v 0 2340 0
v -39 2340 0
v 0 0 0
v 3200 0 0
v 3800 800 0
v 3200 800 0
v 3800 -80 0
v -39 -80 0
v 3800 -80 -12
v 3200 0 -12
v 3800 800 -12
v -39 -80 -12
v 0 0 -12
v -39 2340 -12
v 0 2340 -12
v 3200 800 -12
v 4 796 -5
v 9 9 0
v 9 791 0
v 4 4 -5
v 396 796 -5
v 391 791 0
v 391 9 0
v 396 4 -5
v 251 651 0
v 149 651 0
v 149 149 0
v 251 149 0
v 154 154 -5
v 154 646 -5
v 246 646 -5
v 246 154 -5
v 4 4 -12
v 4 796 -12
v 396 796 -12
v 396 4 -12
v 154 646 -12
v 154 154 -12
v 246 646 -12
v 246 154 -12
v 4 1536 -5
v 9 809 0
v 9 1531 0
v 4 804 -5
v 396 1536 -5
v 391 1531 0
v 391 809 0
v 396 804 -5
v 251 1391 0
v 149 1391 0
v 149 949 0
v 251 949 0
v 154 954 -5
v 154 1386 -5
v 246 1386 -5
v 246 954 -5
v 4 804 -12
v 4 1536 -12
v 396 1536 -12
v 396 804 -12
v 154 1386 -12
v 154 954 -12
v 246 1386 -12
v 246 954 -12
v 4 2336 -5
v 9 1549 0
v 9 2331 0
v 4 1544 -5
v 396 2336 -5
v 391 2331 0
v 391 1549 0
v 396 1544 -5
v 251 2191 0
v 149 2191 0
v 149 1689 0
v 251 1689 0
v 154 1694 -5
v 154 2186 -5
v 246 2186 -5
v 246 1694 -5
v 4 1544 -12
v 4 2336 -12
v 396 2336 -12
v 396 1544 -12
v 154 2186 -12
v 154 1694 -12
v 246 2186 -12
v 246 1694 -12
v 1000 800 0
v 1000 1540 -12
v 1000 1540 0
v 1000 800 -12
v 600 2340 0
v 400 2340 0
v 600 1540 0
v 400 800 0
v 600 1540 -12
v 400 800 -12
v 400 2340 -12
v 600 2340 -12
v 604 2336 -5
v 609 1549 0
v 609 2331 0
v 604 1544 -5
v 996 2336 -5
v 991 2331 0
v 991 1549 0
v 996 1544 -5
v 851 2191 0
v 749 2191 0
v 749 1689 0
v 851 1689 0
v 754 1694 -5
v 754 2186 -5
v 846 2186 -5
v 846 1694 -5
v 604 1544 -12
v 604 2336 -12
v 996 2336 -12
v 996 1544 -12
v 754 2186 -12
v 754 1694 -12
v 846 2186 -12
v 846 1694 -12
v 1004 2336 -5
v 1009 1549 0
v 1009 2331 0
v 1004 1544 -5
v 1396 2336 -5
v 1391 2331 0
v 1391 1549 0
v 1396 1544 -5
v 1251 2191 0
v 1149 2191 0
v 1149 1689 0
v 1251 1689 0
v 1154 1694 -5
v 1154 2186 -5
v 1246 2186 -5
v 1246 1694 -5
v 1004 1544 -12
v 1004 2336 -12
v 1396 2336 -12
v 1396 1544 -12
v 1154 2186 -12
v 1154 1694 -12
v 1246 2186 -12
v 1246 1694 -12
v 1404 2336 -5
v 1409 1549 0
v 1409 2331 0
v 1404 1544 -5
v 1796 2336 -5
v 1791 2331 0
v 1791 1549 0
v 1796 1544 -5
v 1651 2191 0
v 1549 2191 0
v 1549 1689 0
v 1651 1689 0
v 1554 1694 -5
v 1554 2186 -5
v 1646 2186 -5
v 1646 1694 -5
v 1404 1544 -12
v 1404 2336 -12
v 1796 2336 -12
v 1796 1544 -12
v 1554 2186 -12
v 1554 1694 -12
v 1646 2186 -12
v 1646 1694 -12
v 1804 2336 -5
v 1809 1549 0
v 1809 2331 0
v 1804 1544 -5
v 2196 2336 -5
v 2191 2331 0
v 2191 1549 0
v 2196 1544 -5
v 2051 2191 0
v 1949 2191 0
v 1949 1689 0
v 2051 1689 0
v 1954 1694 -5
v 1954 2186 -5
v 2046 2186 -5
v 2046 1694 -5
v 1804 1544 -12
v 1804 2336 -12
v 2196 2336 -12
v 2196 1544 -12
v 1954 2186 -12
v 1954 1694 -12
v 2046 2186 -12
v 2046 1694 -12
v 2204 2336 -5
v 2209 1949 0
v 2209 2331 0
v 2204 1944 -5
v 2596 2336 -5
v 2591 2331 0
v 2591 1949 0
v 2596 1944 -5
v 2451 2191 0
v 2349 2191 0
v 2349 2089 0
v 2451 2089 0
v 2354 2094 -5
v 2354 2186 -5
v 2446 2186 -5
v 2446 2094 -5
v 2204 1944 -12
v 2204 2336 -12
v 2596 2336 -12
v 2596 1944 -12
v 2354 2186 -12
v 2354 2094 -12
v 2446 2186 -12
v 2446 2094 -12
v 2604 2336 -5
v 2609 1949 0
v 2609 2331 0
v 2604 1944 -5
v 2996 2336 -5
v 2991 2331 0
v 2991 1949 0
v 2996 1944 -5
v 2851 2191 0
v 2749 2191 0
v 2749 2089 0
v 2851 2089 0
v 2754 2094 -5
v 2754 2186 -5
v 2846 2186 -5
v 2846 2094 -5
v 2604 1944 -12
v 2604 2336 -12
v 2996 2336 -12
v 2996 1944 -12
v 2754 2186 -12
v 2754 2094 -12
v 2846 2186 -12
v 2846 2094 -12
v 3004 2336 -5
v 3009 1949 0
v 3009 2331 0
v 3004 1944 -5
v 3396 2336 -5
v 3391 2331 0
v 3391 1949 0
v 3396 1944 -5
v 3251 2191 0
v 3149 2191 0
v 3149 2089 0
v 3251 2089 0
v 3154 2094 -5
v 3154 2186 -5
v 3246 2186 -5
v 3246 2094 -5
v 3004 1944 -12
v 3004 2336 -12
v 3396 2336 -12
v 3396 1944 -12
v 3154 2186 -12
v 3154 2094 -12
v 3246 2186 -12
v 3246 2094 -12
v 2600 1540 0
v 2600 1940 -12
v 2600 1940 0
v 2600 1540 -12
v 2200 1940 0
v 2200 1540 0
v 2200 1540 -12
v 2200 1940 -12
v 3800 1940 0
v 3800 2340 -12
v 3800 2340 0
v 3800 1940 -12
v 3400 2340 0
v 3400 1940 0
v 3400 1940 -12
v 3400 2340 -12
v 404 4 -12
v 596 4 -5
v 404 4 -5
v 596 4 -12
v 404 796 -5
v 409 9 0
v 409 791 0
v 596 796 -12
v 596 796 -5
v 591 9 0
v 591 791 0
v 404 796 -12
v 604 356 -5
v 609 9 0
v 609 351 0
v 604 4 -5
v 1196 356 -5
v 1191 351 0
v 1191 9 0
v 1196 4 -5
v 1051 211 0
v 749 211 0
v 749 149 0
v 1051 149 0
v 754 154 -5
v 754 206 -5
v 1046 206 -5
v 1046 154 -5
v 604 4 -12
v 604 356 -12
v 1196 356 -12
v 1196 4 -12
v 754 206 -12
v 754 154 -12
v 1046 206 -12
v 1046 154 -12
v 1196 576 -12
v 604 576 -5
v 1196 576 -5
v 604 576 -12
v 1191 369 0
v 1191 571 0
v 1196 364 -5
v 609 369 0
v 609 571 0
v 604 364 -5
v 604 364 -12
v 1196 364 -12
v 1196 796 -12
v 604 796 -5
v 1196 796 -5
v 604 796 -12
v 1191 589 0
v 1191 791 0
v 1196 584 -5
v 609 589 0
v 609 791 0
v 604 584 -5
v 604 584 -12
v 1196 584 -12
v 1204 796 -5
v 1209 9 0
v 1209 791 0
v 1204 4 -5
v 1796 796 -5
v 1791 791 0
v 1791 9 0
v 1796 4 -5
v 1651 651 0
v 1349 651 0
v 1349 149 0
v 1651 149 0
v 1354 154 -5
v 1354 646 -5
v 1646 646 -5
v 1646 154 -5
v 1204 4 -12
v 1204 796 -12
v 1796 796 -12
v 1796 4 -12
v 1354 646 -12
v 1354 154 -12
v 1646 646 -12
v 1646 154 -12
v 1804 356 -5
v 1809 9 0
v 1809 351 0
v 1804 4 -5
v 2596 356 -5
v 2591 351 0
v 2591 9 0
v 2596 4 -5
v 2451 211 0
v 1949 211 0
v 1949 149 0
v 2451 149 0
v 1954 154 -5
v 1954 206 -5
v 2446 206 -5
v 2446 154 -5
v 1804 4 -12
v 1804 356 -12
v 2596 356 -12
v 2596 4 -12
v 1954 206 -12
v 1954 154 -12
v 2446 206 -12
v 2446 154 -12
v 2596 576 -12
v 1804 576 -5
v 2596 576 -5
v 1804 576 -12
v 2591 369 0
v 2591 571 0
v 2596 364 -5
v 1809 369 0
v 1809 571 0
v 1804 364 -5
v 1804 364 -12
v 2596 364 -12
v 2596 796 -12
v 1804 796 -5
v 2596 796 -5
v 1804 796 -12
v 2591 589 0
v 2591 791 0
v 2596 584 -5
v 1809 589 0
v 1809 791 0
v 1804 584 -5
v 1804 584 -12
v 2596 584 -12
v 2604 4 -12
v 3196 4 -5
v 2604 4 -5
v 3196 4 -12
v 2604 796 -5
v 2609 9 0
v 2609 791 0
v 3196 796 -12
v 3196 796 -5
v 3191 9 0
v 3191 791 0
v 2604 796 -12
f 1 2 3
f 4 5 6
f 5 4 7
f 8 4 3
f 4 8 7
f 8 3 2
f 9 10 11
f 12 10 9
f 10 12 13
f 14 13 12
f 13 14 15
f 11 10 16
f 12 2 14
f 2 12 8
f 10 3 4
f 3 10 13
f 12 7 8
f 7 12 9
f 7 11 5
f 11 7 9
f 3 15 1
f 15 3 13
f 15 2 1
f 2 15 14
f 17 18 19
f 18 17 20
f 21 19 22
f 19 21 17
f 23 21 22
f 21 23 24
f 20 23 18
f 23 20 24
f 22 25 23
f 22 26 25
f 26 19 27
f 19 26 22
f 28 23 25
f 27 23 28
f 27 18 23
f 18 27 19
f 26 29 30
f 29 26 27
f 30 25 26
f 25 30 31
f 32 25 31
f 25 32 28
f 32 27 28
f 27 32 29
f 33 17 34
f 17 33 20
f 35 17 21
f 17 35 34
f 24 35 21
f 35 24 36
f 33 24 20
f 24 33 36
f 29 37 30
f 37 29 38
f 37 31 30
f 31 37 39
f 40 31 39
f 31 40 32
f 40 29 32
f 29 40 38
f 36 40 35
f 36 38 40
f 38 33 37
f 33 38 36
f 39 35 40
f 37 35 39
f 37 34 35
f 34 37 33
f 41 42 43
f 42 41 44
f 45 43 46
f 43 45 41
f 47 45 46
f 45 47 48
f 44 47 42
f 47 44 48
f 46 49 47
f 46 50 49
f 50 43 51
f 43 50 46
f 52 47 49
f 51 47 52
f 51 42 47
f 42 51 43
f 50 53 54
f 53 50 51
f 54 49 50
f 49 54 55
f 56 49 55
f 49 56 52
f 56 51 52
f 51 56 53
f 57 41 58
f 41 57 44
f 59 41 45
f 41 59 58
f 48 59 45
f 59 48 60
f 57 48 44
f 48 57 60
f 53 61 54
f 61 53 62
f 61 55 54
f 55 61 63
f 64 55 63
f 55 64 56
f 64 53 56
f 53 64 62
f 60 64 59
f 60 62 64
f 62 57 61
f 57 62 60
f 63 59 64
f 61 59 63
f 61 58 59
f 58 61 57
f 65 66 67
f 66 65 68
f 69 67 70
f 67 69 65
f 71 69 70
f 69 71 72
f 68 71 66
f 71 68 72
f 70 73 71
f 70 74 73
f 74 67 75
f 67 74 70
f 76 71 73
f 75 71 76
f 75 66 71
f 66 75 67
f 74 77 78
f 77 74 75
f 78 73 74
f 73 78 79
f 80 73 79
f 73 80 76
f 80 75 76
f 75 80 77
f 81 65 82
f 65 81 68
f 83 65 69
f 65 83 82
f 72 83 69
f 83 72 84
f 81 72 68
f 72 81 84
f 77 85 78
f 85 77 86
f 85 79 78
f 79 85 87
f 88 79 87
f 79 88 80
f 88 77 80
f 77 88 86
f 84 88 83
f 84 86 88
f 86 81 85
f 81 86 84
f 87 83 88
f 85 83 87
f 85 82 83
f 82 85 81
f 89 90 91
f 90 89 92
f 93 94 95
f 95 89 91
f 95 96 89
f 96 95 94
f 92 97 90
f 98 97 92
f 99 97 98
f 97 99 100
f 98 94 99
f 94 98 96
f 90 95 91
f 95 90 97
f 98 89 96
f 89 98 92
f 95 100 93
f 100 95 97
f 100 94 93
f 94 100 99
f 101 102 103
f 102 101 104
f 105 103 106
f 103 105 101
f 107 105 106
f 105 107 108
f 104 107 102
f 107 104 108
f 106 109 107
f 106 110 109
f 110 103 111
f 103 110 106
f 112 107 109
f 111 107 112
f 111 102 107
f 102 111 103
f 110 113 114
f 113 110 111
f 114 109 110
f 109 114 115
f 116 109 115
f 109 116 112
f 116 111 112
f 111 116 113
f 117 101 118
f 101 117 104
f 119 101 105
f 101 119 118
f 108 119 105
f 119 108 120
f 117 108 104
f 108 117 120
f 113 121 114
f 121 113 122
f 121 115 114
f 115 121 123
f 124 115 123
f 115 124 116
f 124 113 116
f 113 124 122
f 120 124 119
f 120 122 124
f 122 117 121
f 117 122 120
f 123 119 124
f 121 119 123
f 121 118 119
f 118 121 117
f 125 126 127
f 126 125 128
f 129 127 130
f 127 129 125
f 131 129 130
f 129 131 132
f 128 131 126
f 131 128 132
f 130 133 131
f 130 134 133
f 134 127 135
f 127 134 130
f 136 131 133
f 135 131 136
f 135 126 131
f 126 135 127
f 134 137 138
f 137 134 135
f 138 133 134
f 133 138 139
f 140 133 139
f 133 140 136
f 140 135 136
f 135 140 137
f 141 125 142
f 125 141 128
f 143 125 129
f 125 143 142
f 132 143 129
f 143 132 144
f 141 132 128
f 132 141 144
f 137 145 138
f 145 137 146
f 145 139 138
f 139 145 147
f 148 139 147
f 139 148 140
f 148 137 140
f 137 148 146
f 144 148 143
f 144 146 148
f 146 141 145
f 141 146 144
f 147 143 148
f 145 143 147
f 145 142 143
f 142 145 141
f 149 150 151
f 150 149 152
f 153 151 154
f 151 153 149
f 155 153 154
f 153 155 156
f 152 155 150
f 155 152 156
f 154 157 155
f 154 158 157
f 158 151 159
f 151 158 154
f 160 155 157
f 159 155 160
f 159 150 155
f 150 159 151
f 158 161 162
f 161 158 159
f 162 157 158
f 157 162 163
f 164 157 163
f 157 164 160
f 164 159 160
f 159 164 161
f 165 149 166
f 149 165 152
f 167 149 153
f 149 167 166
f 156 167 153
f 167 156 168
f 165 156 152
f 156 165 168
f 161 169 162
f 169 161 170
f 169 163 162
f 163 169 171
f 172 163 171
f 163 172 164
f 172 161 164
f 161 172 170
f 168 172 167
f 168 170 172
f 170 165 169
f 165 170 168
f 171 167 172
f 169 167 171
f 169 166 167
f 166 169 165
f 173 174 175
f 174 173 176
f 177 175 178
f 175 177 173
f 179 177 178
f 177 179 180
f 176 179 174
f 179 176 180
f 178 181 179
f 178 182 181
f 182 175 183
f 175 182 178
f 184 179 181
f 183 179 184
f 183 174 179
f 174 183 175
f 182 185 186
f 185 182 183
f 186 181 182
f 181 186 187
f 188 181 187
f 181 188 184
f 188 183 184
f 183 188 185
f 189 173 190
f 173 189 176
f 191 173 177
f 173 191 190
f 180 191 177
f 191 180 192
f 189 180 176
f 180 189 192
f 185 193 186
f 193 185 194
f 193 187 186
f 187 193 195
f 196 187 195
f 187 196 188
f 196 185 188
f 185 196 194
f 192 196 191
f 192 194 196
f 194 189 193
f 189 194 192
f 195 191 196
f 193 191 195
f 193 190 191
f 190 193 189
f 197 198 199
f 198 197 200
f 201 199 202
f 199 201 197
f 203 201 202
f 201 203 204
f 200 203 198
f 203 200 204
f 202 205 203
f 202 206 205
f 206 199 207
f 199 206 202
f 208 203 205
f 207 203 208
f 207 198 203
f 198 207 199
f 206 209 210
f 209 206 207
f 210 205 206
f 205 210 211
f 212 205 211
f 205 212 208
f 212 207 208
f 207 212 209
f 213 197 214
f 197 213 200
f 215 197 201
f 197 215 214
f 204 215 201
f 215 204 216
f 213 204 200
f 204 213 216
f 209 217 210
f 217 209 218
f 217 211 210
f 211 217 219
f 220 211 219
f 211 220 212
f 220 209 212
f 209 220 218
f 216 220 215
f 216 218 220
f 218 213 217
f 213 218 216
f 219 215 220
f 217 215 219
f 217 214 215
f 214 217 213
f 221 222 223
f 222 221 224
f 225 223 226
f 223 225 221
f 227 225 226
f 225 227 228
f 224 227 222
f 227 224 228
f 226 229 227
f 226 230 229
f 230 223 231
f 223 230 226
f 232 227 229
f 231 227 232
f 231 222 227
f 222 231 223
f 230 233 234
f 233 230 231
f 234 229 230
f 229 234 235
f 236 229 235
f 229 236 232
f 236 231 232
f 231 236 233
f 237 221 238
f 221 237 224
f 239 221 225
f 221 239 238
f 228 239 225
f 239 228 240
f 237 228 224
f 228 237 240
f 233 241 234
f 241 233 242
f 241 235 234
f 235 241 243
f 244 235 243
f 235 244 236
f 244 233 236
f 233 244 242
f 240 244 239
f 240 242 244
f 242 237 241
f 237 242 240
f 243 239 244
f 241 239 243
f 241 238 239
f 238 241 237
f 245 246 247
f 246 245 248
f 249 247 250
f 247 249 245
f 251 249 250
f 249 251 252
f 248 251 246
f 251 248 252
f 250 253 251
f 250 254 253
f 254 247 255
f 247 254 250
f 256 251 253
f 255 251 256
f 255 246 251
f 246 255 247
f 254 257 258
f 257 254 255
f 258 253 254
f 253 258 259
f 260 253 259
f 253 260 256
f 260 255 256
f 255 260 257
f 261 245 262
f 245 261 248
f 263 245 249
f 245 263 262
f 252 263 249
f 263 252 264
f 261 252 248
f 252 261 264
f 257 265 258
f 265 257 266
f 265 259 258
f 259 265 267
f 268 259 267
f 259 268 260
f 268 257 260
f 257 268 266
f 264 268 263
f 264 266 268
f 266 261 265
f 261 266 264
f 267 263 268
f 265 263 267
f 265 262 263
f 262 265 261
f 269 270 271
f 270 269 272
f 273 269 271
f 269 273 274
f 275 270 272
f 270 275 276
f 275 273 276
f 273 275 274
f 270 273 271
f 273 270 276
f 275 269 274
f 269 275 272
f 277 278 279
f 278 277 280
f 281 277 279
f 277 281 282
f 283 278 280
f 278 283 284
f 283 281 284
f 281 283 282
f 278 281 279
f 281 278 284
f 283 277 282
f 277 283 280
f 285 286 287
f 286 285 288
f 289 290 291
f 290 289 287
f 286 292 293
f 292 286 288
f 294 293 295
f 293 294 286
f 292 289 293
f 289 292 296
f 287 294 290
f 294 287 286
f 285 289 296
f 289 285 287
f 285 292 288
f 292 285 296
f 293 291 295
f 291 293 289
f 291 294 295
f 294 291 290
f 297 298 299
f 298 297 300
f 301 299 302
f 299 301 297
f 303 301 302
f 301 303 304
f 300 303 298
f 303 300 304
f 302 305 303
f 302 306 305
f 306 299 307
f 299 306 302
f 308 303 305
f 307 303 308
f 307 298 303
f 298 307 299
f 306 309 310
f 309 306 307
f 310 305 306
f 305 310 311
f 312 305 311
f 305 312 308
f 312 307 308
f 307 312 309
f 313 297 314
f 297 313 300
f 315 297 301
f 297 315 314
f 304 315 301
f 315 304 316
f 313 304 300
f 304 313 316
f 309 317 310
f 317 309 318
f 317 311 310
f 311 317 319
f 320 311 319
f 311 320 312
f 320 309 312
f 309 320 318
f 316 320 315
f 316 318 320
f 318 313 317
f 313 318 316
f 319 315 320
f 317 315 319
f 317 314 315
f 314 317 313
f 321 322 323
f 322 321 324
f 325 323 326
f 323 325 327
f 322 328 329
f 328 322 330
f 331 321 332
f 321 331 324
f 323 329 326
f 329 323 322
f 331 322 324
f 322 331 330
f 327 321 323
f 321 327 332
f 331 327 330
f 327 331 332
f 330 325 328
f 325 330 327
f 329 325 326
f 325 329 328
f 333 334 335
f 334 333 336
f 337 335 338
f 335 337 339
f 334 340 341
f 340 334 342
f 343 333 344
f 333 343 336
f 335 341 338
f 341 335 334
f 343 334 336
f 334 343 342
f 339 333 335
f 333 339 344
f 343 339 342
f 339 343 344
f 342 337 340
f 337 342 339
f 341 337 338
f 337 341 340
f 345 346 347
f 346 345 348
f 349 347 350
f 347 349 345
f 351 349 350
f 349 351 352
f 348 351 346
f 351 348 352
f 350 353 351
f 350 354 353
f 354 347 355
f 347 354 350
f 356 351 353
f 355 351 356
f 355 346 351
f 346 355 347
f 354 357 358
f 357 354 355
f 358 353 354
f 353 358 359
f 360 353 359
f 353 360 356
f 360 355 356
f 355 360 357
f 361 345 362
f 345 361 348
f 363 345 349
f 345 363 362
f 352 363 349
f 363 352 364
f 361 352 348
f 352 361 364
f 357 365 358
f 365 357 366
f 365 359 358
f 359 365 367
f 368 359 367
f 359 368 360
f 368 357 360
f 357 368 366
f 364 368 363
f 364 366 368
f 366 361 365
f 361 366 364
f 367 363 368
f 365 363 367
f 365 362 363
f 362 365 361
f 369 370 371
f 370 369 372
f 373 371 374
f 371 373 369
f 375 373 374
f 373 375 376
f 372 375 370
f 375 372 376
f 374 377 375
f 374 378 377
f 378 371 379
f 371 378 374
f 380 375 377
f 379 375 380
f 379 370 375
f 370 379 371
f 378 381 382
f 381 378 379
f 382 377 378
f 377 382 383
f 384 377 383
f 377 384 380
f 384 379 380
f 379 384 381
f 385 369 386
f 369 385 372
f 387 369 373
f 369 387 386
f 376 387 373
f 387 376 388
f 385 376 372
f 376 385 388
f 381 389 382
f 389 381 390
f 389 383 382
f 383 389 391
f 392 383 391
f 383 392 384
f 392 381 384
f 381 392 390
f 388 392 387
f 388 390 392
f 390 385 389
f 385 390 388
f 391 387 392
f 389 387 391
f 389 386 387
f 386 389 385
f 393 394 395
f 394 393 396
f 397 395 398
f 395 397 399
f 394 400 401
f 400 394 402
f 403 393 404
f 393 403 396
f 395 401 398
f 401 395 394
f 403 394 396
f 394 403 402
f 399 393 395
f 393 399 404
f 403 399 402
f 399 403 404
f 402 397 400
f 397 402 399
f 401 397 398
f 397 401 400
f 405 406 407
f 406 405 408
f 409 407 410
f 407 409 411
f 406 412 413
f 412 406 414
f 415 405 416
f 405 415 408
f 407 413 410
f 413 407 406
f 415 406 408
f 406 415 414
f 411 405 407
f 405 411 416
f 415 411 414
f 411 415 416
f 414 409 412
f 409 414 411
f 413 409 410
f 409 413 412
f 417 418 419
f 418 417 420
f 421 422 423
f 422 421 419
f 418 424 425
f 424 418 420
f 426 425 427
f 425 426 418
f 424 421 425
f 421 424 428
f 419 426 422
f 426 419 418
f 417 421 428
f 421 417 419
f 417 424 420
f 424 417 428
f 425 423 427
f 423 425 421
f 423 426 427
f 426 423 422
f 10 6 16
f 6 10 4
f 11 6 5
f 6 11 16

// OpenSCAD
// file: door.scad
b = 150;
p = 4; // padding
f = 5; 
d = 12;
module setDoorGlobals(border,thickness,fase,padding) {
    b = border;
    p = padding;
    d = thickness;
    f = fase;
}
function getDoorPoints(width,height) =
    [[0,0,0], // 0
      [        p,         p,  -f],   // 1
      [        p,  height-p,  -f],   // 2
      [  width-p,  height-p,  -f],   // 3
      [  width-p,         p,  -f],   // 4
      [      f+p,       f+p,   0],   // 5
      [      f+p,height-f-p,   0],   // 6
      [width-f-p,height-f-p,   0],   // 7
      [width-f-p,       f+p,   0],   // 8
      [    b-f+p,     b-f+p,   0],   // 9
      [    b-f+p,height-b+f-p, 0],   // 10
      [width-b+f-p,height-b+f-p,0],  // 11
      [width-b+f-p,   b-f+p,   0],   // 12
      [      b+p,       b+p,  -f],   // 13
      [      b+p,height-b-p,  -f],   // 14
      [width-b-p,height-b-p,  -f],   // 15
      [width-b-p,       b+p,  -f],   // 16
      [        p,         p,  -d],   // 17
      [        p,  height-p,  -d],   // 18
      [  width-p,  height-p,  -d],   // 19
      [  width-p,         p,  -d],   // 20
      [      b+p,       b+p,  -d],   // 21
      [      b+p,height-b-p,  -d],   // 22
      [width-b-p,height-b-p,  -d],   // 23
      [width-b-p,       b+p,  -d],   // 24
      ];
module gDoor(x,y,width,height) {
    translate([x,y,0])
    polyhedron(
    points = getDoorPoints(width,height),  
    faces = [[ 1, 2, 6, 5],  // a
             [ 2, 3, 7, 6],  // b
             [ 3, 4, 8, 7],  // c
             [ 4, 1, 5, 8],  // d
             [ 5, 6,10, 9],  // e
             [ 6, 7,11,10],  // f
             [ 7, 8,12,11],  // g
             [ 8, 5, 9,12],  // h
             [ 9,10,14,13],  // i
             [10,11,15,14],  // j
             [11,12,16,15],  // k
             [12, 9,13,16],  // l
             [ 2, 1,17,18],  //aussenrand
             [ 3, 2,18,19],
             [ 4, 3,19,20],
             [ 1, 4,20,17],
             [13,14,22,21],  //innenrand  
             [14,15,23,22],
             [15,16,24,23],
             [16,13,21,24],
             [21,22,18,17],  // rueckseite
             [22,23,19,18],
             [23,24,20,19],
             [24,21,17,20]
             ]); 
}

module mDoor(x,y,width,height) {
    translate([x,y,0])
    polyhedron(
 getDoorPoints(width,height),  
    faces = [[ 1, 2, 6, 5],  // a
             [ 2, 3, 7, 6],  // b
             [ 3, 4, 8, 7],  // c
             [ 4, 1, 5, 8],  // d
             [ 5, 6,7, 8],  // front
             [ 2, 1,17,18],  //aussenrand
             [ 3, 2,18,19],
             [ 4, 3,19,20],
             [ 1, 4,20,17],
             [20,19,18,17]   // rueckseite
           ]); 
}
module sDoor(x,y,width,height) {
    translate([x,y,-d])
        cube([width,height,d]);
}
//gDoor(0,0,600,800);
//gDoor(700,0,600,800);
// file: front.scad
include <door.scad>

sockelH = 80;
tableH = 800;
fullH = 2200+140;
headBH = 800;
headSH = 400;
drawBH = 360;
drawSH = 220;
doorM = 1;
doorG = 2;
doorS = 3;
border = 150;
padding = 4; 
fase = 15; 
thickness = 20;
cWood = [.83,.80,.75];
cWall = [1,1,1];
cBench = [0.1,0.1,0.1];
function getFronts()=[
    // Sockel
    [doorS,-39, -sockelH ,6*400+200+39,sockelH,0,[0,0]],        //  0
    [doorS,6*400+200, -sockelH,600,sockelH,-90,[0,0]],          //  1
    [doorS,6*400+200+600, -sockelH,600,sockelH,0,[-600,600]],   //  2
    [doorS,-39, 0, 39,fullH,0,[0,0]],
    
    // Hochschrank
    [doorG,0,0,400,tableH,0,[0,0]],                             //  3
    [doorG,0,tableH,400,fullH-tableH-headBH,0,[0,0]],           //  4
    [doorG,0,fullH-headBH,400,headBH,0,[0,0]],                  //  5
    // Seitenteil
    [doorS,400,tableH,600,fullH-tableH-headBH,90,[0,0]],        //  6
    [doorS,400,fullH-headBH,200,headBH,90,[0,0]],               //  7
    // Grosse Oberschraenke
    for(i = [0:3])
        [doorG,600+i*400,fullH-headBH,400,headBH,0,[-200,-200]],    //  8..11
    // Kleine Oberschraenke
    for(i = [0:1])
        [doorG,200+5*400+i*400,fullH-headSH,400,headSH,0,[-200,-200]],  // 12,13
    [doorG,200+5*400+2*400,fullH-headSH,400,headSH,-90,[-200,-200]],    // 14
    // Abschluss Seitenteil gross zu klein
    [doorS,200+5*400,fullH-headBH,400,headBH-headSH,90,[-200,-200]],    // 15
 // Abschluss Seitenteil oben
    [doorS,200+8*400,fullH-headSH,400,headSH,0,[-600,200]],             // 16
 
    // Schmaler Schieber
    [doorM,400,0,200,800,0,[0,0]],                              // 17
    // Schieber unter Kochfeld
    [doorG,600,0,600,drawBH,0,[0,0]],                           // 18
    [doorM,600,drawBH,600,drawSH,0,[0,0]],                      // 19
    [doorM,600,drawBH+drawSH,600,drawSH,0,[0,0]],               // 20
    // Spuele 
    [doorG,2*600,0,600,tableH,0,[0,0]],                         // 21
    // Breite Schieber
    [doorG,3*600,0,800,drawBH,0,[0,0]],                         // 22
    [doorM,3*600,drawBH,800,drawSH,0,[0,0]],                    // 23
    [doorM,3*600,drawBH+drawSH,800,drawSH,0,[0,0]],             // 24
    // Geschirrspueler
    [doorM,3*600+800,0,600,tableH,-90,[0,0]],                   // 25
    // Abschluss Seitenteil unten
    [doorS,4*600+800,0,600,tableH,0,[-600,600]]                 // 26
];

module board(c,x,y,z,w,h,d){
    color(c)
        translate([x,y,z])
            cube([w,h,d]);
}

module boards(material = -1){
    union(){
        if (material == -1 || material == 1) {  
            //Seitenwände
            board(cWood,-39            ,-sockelH,-600 ,thickness,fullH+sockelH,600);
            board(cWood,8*400-thickness,-sockelH,-600,thickness,tableH+sockelH,1200);
            board(cWood,8*400-thickness,fullH-headSH,-600,thickness,headSH,800);
            // Deckel
            board(cWood,-39,fullH-thickness,-600,8*400+39,thickness,400);
            board(cWood,-39,fullH-thickness,-200,400+39,thickness,200);
            board(cWood,7*400,fullH-thickness,-200,400,thickness,400);
            // Unterseiten oben
            board(cWood,400,fullH-headBH,-600,4*400,thickness,400);
            board(cWood,5*400,fullH-headBH+headSH,-600,3*400,thickness,400);
            board(cWood,7*400,fullH-headBH+headSH,-200,400,thickness,400);
            // Unterseiten unten
            board(cWood,-39,-sockelH,-600,8*400+39,thickness,600);
            board(cWood,3*600+800,-sockelH,0,600,thickness,600);
        }
        if (material == -1 || material == 2) {  
            // Arbeitsplatte
            board(cBench,400,tableH,-600,3*600+800+200,3*thickness,600+20);
            board(cBench,3*600+800-20,tableH,0,620,3*thickness,600);
        }
        if (material == -1 || material == 3) {  
            // Waende
            board(cWall,-39,-sockelH,-600,8*400+39,fullH+sockelH+100,thickness);
            board(cWall,8*400-thickness,-sockelH,-600,thickness,fullH+sockelH+100,1500);
        }
   }
}
module front3D(index=-1){
    fronts = getFronts();
    union(){
        if (index == -1)
            union()
            for(i = [0:len(fronts)-1]) {
                f = fronts[i];
                echo(i,floor(100*(i+1)/len(fronts)),"%",f);
                translate([f[1]+f[6][0],f[2],f[6][1]])
                    rotate([0,f[5],0])
                        translate(-[f[1],f[2],0])
                            if (f[0] == doorM) 
                                mDoor(f[1],f[2],f[3],f[4]);
                            else if (f[0] == doorG) 
                                gDoor(f[1],f[2],f[3],f[4]);
                            else if (f[0] == doorS) 
                                sDoor(f[1],f[2],f[3],f[4]);
            }
        else {
            f = fronts[index];
            i = index;
            translate([f[1]+f[6][0],f[2],f[6][1]])
                rotate([0,f[5],0])
                    translate(-[f[1],f[2],0])
                        if (f[0] == doorM) 
                            mDoor(f[1],f[2],f[3],f[4]);
                        else if (f[0] == doorG) 
                            gDoor(f[1],f[2],f[3],f[4]);
                        else if (f[0] == doorS) 
                            sDoor(f[1],f[2],f[3],f[4]);
        }    
        boards();
    }
}


module front(index=-1){
    fronts = getFronts();
    if (index == -1) {
        union()
            for(f = fronts) {
                if (f[0] == doorM) 
                    mDoor(f[1],f[2],f[3],f[4]);
                else if (f[0] == doorG) 
                    gDoor(f[1],f[2],f[3],f[4]);
                else if (f[0] == doorS) 
                    sDoor(f[1],f[2],f[3],f[4]);
            }
    } else {
        f = fronts[index];
        if (f[0] == doorM) 
            mDoor(f[1],f[2],f[3],f[4]);
        else if (f[0] == doorG) 
            gDoor(f[1],f[2],f[3],f[4]);
        else if (f[0] == doorS) 
            sDoor(f[1],f[2],f[3],f[4]);      
    }
}

module cutBody(index=-1){
    fronts = getFronts();
    if (index == -1) {
        union()
            for(f = fronts)    
                if (f[0]==doorS)
                    translate([f[1],f[2],-50]) 
                        cube([f[3],f[4],100]);
                else 
                  translate([f[1]+padding,f[2]+padding,-50]) 
                    cube([f[3]-2*padding,f[4]-2*padding,100]);
   } else {
        f = fronts[index];
        if (f[0]==doorS)
            translate([f[1],f[2],-50]) 
                cube([f[3],f[4],100]);
        else 
          translate([f[1]+padding,f[2]+padding,-50]) 
            cube([f[3]-2*padding,f[4]-2*padding,100]);
   }
}

setDoorGlobals(border,thickness,fase,padding);
//front3D();
// main file
include <front.scad>
material = 0;
if (material == 0)
    front();
else {
    boards(material);
}
